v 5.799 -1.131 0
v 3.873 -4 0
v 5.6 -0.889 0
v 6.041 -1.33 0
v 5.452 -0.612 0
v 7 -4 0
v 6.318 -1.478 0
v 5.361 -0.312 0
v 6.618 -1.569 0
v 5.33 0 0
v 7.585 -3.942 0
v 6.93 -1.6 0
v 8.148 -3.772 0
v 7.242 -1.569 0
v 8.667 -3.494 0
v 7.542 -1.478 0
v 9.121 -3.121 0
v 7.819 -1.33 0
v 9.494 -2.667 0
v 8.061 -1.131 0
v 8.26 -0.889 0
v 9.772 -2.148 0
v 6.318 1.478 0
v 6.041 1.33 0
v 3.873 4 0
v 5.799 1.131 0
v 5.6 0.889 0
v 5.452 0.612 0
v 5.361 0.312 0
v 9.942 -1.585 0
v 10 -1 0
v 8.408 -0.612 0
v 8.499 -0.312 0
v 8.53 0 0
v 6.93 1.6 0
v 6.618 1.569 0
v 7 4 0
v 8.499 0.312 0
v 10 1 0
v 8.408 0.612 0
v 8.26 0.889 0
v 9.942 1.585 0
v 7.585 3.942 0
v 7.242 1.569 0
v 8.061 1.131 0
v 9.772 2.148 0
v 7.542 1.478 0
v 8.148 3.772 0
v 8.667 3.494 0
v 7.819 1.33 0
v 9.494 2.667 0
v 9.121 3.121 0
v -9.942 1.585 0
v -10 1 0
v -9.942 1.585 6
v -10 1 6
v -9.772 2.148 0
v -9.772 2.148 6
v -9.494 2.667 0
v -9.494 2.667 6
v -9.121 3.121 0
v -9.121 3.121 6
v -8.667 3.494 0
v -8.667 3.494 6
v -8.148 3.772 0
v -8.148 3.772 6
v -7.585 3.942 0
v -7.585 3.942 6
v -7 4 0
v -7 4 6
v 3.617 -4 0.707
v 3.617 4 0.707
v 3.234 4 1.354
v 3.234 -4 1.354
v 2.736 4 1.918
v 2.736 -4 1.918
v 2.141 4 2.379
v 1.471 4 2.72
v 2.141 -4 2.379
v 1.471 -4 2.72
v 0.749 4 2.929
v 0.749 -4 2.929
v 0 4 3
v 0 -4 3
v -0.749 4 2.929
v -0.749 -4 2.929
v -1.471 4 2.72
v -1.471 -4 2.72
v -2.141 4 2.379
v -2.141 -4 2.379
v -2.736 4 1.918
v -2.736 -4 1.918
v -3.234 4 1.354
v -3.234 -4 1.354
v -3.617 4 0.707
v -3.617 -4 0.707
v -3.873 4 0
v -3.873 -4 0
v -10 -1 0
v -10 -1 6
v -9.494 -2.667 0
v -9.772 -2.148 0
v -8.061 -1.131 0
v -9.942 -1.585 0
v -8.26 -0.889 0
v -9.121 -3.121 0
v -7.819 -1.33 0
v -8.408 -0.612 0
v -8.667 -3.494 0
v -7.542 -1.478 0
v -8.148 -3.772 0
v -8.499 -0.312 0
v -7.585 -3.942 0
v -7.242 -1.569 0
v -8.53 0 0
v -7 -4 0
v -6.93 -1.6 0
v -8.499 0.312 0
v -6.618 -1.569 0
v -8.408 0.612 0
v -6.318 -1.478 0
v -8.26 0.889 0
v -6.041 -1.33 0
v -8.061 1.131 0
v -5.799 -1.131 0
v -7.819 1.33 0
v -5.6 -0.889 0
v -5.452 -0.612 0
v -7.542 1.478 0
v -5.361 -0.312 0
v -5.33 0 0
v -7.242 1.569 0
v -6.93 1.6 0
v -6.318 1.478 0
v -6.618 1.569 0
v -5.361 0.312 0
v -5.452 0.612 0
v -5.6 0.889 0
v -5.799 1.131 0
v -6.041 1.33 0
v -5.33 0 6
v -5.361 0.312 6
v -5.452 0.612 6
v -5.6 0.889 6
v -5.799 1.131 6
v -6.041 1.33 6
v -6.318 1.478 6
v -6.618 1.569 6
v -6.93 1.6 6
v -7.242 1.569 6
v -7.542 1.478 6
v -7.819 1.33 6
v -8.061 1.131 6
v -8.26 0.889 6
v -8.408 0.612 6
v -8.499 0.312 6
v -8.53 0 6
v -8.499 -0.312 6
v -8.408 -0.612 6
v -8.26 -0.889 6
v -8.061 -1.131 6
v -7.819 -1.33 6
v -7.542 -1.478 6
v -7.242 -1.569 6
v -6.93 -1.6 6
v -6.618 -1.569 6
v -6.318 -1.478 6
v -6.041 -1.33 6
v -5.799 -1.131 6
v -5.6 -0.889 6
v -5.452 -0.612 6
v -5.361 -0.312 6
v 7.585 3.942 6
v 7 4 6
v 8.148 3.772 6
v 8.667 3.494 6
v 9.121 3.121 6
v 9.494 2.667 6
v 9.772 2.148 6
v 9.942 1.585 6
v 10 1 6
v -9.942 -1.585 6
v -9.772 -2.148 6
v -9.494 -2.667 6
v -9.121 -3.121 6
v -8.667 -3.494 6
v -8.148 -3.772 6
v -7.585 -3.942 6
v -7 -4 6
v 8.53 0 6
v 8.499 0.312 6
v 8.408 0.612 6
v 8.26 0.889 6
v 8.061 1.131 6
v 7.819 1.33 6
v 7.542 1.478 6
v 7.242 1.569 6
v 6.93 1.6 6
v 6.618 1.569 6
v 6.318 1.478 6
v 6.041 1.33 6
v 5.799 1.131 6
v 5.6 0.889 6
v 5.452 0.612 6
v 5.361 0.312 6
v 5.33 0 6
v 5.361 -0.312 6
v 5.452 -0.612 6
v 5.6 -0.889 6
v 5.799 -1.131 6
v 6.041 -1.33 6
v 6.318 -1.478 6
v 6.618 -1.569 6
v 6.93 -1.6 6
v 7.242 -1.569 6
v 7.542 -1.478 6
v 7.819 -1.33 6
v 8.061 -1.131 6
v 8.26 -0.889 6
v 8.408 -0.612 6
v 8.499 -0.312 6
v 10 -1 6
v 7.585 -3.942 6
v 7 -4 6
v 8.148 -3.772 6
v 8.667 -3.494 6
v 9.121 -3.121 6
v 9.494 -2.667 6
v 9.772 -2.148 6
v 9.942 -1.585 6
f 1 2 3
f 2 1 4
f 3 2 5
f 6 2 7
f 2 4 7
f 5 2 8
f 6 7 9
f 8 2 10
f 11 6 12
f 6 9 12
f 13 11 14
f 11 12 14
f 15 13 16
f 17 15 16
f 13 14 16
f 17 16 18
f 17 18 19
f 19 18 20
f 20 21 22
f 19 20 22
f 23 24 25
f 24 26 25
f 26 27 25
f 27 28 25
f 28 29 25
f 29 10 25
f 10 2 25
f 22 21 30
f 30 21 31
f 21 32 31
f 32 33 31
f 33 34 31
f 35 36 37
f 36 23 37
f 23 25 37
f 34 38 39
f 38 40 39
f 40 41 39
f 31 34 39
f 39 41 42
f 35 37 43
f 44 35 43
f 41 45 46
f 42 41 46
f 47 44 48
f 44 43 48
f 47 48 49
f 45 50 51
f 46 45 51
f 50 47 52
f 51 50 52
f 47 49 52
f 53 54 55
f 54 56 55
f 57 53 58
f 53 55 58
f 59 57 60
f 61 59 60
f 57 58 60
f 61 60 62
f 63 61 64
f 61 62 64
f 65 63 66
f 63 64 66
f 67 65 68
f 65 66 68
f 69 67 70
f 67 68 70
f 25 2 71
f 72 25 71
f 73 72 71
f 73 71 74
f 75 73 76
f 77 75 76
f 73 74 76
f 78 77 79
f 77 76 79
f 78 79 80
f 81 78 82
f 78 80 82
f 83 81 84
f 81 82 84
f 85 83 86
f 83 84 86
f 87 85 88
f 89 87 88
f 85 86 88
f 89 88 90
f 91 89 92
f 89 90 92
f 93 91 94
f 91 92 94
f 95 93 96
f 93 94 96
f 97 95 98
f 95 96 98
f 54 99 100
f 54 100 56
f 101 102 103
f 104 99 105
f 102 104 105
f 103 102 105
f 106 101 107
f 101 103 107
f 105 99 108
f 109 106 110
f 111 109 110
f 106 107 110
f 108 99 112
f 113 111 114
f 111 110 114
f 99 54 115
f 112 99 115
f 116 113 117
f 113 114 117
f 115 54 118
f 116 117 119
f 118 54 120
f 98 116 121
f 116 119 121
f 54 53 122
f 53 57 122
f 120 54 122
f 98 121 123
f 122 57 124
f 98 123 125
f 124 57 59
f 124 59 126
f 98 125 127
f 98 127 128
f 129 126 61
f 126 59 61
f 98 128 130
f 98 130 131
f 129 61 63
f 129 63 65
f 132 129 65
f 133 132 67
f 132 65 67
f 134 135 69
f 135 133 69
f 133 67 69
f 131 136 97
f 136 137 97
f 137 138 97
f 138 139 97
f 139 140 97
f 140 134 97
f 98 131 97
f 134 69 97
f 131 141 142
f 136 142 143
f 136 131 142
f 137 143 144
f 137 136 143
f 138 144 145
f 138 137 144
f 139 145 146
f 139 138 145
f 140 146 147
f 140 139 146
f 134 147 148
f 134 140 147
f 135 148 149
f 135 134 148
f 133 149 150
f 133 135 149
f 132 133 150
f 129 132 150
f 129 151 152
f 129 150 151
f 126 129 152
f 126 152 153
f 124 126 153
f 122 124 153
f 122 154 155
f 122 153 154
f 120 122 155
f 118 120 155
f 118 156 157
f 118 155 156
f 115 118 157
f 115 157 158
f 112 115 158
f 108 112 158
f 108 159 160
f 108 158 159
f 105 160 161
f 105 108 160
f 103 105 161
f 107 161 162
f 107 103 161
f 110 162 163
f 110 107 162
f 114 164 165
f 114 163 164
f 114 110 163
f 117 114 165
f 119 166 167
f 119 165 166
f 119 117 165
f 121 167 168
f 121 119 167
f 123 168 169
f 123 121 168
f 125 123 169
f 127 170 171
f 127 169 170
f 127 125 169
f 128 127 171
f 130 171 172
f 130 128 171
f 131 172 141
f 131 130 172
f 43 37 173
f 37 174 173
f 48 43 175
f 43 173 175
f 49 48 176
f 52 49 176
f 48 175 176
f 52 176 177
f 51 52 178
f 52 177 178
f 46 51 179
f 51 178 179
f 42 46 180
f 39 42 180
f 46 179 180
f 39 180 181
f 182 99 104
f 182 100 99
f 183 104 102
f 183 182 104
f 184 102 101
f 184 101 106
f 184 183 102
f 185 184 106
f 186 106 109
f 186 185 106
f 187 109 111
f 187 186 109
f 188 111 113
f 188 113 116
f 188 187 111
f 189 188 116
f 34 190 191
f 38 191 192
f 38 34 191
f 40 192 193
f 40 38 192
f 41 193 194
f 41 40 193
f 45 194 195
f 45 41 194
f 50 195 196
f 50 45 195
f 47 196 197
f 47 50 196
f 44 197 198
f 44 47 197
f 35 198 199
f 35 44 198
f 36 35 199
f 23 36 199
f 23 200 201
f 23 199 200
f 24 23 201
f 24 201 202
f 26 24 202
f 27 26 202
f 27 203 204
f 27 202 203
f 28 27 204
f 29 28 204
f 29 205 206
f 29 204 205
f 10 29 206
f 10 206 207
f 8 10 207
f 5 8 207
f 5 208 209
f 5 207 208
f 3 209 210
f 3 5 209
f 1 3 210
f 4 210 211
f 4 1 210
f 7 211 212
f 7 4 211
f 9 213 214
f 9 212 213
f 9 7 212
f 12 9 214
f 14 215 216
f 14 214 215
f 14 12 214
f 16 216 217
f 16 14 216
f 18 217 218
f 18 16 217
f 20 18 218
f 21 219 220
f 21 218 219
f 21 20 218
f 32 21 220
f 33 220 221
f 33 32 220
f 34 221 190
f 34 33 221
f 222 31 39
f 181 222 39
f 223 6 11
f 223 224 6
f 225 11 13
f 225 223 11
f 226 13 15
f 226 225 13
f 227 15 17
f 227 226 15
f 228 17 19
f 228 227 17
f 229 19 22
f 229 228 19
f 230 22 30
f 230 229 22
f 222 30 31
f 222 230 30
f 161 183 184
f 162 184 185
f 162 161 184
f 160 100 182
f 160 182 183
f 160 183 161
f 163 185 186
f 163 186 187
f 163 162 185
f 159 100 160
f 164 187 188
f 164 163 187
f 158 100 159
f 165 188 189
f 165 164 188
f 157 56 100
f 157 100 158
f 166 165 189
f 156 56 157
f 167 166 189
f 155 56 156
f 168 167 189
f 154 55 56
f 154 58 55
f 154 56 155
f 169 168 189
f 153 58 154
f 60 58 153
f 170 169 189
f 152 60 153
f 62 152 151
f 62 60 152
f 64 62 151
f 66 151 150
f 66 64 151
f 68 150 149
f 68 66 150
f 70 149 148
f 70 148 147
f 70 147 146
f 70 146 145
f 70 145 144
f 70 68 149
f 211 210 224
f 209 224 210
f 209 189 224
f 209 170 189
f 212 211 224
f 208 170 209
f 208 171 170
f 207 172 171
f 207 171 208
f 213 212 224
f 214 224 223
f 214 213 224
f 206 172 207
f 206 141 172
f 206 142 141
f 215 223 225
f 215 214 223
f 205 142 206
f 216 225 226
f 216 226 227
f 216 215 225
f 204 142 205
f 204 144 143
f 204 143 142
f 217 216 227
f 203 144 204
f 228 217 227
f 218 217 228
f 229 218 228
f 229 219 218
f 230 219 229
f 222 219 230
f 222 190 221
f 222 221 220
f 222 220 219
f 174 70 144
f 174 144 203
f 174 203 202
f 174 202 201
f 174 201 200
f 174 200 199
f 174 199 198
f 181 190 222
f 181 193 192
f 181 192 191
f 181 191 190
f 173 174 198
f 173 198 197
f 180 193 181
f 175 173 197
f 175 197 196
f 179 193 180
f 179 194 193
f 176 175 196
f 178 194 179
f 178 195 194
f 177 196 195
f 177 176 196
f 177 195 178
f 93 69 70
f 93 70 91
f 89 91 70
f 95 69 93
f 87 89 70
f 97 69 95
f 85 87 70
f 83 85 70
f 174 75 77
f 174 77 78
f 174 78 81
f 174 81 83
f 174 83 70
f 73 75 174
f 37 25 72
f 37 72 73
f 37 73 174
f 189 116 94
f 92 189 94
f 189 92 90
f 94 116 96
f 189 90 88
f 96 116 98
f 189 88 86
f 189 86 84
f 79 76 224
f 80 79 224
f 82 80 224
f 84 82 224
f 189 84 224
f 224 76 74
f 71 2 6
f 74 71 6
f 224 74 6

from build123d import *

# Parameters (mm, degrees)
SKETCH004_W     = 20
SKETCH004_H     = 8
PAD003_DEPTH    = 6
POCKET001_DEPTH = 5
SKETCH006_R     = 1.6
POCKET002_DEPTH = 11
FILLET004_R     = 3


with BuildPart() as part:
    # Sketch004 (on XY_Plane001 of Origin002) → Pad003 (new body)
    with BuildSketch(Plane.XY):
        Rectangle(SKETCH004_W, SKETCH004_H)
    extrude(amount=PAD003_DEPTH)

    # Sketch005 (on XZ_Plane001 of Origin002) → Pocket001 (cut, symmetric)
    with BuildSketch(Plane.XZ):
        with BuildLine():
            Line((-3.5, -2.936492), (3.5, -2.936492))
            ThreePointArc((3.5, -2.936492), (0, 3), (-3.5, -2.936492))
        make_face()
    extrude(amount=POCKET001_DEPTH, both=True, mode=Mode.SUBTRACT)

    # Sketch006 (on XY_Plane001 of Origin002) → Pocket002 (cut)
    with BuildSketch(Plane.XY):
        with Locations((-6.93, 0)):
            Circle(SKETCH006_R)
        with Locations((6.93, 0)):
            Circle(SKETCH006_R)
    extrude(amount=POCKET002_DEPTH, mode=Mode.SUBTRACT)

    # Fillet004
    fillet004_edges = [part.edges().sort_by_distance(p)[0] for p in [
        (10, 4, 3),
        (10, -4, 3),
        (-10, -4, 3),
        (-10, 4, 3),
    ]]
    fillet(fillet004_edges, radius=FILLET004_R)


solid = part.part
